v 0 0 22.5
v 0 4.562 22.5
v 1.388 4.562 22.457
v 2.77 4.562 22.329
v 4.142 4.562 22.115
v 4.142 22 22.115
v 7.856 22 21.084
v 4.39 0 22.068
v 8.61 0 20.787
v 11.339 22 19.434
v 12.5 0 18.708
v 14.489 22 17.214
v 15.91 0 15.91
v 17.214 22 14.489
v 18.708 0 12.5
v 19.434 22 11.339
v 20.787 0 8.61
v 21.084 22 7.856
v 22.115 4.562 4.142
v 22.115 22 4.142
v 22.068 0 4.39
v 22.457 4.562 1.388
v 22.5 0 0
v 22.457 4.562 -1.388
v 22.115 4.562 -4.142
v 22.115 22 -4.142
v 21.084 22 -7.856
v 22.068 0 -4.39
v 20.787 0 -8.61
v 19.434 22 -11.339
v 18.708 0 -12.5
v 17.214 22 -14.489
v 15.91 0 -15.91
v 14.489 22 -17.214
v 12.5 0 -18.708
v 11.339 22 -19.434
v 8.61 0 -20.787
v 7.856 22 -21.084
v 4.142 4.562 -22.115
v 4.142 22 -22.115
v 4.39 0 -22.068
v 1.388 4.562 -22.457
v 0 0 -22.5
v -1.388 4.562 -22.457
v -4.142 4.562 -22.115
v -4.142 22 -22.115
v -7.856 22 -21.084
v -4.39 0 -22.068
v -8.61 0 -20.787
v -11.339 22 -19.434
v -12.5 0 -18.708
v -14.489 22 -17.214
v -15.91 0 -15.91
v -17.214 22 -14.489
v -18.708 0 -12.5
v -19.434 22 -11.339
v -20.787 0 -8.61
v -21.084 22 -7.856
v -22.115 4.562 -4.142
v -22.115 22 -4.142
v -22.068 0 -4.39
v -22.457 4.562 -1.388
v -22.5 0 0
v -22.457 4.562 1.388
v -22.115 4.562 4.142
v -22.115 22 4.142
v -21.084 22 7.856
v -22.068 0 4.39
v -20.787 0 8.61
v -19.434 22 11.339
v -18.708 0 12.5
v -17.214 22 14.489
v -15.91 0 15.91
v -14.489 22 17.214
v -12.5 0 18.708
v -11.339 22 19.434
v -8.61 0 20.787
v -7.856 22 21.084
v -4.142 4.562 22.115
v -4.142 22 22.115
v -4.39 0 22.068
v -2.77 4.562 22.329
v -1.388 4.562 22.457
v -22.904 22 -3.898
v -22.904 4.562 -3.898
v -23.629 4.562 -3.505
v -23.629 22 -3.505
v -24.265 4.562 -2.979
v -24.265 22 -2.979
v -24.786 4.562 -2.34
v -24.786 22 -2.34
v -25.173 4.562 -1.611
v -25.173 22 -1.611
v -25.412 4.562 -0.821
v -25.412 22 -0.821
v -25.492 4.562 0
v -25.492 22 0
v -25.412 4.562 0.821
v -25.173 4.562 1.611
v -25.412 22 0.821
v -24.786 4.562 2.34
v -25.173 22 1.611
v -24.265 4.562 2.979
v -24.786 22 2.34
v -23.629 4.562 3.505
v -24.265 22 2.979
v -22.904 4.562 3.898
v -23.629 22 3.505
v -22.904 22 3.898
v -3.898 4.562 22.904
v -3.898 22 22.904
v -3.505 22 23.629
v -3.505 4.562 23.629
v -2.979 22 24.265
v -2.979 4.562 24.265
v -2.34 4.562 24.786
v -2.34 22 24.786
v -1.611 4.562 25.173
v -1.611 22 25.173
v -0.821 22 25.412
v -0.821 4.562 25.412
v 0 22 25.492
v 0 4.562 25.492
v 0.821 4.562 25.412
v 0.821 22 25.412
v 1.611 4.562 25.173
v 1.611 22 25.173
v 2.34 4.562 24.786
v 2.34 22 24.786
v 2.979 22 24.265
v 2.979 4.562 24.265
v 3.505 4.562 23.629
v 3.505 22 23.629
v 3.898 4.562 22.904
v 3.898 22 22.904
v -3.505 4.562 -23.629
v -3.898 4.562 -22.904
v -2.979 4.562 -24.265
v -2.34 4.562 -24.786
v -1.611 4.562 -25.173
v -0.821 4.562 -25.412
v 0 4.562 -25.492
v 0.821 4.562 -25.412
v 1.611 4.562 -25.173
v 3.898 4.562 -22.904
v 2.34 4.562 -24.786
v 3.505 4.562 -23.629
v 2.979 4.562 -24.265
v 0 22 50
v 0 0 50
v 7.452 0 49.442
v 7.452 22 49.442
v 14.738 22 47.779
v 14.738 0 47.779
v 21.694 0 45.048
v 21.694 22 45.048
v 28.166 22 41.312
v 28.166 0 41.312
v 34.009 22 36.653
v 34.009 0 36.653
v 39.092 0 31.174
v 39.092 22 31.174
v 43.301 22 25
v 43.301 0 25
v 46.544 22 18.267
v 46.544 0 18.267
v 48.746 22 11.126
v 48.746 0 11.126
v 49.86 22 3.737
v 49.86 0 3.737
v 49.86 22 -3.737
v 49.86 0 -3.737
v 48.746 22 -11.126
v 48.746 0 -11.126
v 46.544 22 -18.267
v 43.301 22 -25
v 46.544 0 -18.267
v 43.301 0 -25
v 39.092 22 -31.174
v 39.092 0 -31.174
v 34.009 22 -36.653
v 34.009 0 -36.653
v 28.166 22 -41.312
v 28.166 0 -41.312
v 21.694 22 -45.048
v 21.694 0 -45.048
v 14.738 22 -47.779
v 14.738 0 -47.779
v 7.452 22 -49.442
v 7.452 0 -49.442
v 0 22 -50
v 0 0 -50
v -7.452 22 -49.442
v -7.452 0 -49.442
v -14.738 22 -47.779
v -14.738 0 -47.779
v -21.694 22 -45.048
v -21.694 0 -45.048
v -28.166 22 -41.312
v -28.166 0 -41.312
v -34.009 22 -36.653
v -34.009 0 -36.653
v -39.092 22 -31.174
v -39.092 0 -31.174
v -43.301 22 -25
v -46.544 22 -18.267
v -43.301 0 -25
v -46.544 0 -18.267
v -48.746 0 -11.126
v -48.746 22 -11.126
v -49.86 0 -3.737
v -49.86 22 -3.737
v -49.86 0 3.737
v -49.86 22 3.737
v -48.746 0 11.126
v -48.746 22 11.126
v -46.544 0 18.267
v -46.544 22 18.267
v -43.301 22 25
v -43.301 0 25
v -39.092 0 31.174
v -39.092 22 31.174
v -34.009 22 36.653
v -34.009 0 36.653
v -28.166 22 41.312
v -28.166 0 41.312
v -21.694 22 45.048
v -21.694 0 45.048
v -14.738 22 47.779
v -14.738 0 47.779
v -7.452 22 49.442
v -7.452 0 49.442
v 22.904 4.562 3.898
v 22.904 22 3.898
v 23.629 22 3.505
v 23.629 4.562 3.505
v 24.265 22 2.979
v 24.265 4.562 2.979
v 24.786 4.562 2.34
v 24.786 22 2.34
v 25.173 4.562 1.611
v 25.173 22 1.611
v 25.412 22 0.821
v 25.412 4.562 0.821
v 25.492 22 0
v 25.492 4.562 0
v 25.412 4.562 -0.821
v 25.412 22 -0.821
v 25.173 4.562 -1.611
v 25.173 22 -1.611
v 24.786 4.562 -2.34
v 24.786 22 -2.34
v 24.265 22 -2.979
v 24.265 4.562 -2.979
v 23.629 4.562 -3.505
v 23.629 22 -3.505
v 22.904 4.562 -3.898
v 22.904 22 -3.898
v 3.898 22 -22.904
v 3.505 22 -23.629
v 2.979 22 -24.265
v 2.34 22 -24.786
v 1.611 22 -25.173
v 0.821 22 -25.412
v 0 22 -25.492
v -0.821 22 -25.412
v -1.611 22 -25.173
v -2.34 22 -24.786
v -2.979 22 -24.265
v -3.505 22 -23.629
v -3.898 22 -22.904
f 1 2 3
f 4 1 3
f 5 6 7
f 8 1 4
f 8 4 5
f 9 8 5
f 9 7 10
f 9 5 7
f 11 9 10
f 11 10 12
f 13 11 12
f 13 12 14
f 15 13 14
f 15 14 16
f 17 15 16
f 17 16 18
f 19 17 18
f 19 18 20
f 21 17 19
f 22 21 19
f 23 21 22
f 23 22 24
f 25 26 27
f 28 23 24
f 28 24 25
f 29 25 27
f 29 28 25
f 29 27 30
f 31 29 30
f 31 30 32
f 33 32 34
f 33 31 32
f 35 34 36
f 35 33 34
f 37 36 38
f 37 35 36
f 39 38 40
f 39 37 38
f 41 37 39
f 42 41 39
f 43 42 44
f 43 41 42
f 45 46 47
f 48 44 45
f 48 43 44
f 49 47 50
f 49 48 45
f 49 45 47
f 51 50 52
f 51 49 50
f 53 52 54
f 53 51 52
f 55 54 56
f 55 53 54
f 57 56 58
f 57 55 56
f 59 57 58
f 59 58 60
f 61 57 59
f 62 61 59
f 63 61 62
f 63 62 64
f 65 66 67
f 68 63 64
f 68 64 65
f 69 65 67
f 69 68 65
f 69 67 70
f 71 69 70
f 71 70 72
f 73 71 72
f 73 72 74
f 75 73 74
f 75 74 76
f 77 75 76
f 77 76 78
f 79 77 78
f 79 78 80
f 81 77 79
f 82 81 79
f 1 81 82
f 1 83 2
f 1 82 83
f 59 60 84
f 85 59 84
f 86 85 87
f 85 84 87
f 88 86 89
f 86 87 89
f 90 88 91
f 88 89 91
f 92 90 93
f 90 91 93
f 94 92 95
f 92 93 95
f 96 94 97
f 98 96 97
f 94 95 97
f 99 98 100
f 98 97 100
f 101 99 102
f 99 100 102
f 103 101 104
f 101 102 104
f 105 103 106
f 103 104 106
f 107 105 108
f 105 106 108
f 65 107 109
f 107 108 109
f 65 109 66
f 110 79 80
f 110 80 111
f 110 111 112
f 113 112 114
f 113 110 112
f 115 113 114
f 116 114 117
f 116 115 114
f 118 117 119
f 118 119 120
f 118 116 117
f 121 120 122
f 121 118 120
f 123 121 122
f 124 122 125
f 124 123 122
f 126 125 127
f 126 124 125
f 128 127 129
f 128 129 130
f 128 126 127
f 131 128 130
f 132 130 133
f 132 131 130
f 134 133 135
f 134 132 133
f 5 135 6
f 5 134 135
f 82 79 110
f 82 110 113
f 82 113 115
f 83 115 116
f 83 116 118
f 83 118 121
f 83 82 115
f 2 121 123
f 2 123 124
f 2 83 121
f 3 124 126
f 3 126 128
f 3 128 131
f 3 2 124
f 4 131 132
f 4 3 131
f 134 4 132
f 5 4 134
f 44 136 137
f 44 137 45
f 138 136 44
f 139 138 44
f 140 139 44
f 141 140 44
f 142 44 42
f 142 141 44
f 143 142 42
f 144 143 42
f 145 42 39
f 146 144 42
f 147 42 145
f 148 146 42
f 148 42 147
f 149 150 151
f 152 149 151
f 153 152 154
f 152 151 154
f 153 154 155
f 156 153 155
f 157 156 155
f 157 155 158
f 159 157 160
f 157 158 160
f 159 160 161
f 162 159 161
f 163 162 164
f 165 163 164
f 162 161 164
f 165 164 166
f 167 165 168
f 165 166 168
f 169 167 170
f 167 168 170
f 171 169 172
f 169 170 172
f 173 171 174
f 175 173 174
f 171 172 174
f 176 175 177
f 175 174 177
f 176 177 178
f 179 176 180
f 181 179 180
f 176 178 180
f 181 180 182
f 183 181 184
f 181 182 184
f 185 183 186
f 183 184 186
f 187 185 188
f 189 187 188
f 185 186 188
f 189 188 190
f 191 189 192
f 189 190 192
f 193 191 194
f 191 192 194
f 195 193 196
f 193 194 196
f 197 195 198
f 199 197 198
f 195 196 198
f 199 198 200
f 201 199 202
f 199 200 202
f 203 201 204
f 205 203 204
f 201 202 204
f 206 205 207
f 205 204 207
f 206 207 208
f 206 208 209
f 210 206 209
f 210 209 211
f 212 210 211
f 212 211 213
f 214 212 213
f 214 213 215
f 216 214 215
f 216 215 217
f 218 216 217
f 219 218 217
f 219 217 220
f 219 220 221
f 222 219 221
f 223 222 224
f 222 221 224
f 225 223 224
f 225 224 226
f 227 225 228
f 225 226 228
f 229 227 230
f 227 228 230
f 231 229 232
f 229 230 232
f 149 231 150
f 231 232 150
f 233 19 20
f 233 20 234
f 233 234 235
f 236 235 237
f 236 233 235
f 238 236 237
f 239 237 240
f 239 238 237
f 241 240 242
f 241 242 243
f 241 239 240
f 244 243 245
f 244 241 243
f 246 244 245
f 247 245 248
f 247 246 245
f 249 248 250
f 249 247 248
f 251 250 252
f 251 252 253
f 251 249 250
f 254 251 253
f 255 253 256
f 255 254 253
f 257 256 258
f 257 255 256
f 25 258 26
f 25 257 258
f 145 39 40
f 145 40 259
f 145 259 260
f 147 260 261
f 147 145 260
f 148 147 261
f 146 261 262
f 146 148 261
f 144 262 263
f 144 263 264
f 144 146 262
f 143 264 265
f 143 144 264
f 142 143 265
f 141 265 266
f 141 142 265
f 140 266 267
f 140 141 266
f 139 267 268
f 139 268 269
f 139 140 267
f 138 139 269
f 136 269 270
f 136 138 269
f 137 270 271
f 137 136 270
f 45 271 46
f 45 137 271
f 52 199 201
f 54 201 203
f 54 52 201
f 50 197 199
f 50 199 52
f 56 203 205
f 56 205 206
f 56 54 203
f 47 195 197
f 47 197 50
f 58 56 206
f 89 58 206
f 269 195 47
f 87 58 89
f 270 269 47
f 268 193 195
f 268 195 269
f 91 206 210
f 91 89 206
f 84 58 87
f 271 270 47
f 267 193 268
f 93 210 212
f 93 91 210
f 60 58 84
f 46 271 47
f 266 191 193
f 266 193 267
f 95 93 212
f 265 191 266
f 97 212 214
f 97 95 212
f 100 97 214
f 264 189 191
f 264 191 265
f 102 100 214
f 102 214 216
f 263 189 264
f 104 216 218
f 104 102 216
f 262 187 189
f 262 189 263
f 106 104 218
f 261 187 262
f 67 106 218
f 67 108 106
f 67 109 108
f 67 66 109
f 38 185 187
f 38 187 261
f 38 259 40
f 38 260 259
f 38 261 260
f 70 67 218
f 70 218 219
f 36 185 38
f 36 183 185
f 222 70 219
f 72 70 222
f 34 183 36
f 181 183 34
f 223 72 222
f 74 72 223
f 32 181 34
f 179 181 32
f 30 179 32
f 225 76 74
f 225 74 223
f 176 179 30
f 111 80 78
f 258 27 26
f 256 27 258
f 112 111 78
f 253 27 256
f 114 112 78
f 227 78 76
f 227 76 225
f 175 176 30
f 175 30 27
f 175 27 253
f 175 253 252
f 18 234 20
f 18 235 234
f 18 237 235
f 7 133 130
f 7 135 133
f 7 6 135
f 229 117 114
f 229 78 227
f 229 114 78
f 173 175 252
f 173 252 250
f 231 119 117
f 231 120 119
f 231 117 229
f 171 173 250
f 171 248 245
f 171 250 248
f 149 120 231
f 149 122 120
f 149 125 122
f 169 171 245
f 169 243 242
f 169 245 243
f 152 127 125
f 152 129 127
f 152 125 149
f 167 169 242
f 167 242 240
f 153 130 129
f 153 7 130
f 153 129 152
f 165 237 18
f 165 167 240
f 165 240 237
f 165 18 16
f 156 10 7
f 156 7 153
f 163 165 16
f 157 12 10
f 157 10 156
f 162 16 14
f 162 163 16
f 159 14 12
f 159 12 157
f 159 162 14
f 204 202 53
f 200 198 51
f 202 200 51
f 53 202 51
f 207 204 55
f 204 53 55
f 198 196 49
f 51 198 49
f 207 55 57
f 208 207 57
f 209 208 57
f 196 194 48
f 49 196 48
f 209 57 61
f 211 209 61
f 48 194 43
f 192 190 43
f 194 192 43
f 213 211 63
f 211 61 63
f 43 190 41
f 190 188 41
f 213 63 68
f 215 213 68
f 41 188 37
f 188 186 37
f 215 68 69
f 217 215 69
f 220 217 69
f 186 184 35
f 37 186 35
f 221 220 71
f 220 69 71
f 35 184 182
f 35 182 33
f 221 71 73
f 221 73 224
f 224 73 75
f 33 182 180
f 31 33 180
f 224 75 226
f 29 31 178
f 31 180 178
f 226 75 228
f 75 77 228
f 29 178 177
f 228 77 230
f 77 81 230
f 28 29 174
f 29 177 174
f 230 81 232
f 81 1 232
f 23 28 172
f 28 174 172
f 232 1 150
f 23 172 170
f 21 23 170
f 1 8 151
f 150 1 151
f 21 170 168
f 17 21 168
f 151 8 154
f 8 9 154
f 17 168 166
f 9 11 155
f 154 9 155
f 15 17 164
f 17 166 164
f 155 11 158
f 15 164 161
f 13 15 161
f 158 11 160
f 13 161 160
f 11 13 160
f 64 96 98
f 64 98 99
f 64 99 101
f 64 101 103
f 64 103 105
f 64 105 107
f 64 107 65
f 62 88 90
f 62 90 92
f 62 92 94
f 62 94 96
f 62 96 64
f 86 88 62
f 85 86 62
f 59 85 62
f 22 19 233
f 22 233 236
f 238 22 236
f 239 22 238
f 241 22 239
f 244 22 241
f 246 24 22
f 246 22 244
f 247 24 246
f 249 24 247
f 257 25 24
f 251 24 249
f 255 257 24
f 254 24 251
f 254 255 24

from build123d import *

# Parameters (mm, degrees)
SKETCH1_R           = 50
BOSS_EXTRUDE1_DEPTH = 22
SKETCH2_R           = 22.5
CUT_EXTRUDE1_DEPTH  = 75.054034326
SKETCH3_R           = 4.229056578
CUT_EXTRUDE2_DEPTH  = 17.438124461
CIRPATTERN1_COUNT   = 4


with BuildPart() as part:
    # Sketch1 → Boss-Extrude1 (new body)
    with BuildSketch(Plane(origin=(0, 0, 0), x_dir=(1, 0, 0), z_dir=(0, 1, 0))):
        Circle(SKETCH1_R)
    extrude(amount=BOSS_EXTRUDE1_DEPTH)

    # Sketch2 → Cut-Extrude1 (cut, through all)
    with BuildSketch(Plane(origin=(0, 0, 0), x_dir=(1, 0, 0), z_dir=(0, 1, 0))):
        Circle(SKETCH2_R)
    extrude(amount=CUT_EXTRUDE1_DEPTH, mode=Mode.SUBTRACT)

    # Sketch3 → Cut-Extrude2 (cut)
    with BuildSketch(Plane(origin=(0, 22, 0), x_dir=(1, 0, 0), z_dir=(0, 1, 0))):
        with Locations((-21.263269619, 0)):
            Circle(SKETCH3_R)
    cut_extrude2 = extrude(amount=-CUT_EXTRUDE2_DEPTH, mode=Mode.SUBTRACT)

    # CirPattern1: Cut-Extrude2 ×4 about axis
    cirpattern1_axis = Axis((0, 0, 0), (0, 1, 0))
    for i in range(1, CIRPATTERN1_COUNT):
        add(cut_extrude2.rotate(cirpattern1_axis, i * 360 / CIRPATTERN1_COUNT), mode=Mode.SUBTRACT)


solid = part.part
